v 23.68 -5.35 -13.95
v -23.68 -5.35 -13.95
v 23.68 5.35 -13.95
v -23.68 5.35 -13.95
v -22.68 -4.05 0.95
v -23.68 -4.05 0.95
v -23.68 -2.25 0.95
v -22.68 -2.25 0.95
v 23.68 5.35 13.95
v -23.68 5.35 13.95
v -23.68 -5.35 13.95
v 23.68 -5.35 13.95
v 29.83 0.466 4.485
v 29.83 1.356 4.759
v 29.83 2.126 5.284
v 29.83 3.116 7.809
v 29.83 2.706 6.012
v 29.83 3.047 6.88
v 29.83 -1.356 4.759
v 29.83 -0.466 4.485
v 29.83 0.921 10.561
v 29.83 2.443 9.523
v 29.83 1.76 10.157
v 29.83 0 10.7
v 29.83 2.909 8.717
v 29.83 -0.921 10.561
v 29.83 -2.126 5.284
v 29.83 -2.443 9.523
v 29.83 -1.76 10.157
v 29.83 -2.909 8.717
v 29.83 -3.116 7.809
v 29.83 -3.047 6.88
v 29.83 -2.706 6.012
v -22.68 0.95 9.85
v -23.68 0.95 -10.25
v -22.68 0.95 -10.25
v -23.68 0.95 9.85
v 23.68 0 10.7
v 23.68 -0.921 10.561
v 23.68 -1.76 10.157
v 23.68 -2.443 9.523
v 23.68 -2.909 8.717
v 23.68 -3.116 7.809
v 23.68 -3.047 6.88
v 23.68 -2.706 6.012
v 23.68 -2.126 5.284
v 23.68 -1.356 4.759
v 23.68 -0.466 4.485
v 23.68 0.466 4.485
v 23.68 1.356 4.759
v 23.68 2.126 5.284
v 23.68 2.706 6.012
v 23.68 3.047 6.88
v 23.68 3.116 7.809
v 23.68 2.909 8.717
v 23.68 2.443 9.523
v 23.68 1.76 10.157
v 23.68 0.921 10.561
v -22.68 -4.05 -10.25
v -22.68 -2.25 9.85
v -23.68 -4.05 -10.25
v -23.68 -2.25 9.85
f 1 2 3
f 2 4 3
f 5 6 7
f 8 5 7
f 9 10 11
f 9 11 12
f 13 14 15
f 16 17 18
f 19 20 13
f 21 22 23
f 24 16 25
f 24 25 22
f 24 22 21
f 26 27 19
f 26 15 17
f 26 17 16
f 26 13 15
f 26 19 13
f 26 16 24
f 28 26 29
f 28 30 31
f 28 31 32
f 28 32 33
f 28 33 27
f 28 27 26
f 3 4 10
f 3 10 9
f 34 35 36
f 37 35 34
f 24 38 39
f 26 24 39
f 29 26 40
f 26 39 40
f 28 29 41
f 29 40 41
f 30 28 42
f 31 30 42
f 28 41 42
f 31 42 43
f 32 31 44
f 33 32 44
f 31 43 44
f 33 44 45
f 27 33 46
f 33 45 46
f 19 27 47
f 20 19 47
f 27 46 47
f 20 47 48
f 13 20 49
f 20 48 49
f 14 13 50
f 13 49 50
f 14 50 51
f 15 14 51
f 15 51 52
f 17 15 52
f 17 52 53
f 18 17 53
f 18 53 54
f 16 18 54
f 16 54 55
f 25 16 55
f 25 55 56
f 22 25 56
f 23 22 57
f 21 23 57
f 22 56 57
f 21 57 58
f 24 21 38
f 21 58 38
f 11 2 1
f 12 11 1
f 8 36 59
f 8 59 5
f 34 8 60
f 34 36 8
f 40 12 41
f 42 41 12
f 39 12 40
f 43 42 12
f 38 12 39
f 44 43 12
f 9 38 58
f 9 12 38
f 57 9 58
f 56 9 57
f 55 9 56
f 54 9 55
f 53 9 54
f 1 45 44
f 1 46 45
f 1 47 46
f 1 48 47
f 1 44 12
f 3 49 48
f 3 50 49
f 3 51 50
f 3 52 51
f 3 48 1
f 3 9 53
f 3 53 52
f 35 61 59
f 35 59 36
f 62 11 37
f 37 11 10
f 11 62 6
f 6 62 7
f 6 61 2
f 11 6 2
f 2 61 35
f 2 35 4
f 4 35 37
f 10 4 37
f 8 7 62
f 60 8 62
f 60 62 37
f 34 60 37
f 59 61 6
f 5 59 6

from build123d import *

# Parameters (mm, degrees)
SKETCH1_W           = 47.36
SKETCH1_H           = 27.9
BOSS_EXTRUDE1_DEPTH = 5.35
SKETCH2_R           = 3.125
BOSS_EXTRUDE2_DEPTH = 6.15
SKETCH3_W           = 11.2
SKETCH3_H           = 5
CUT_EXTRUDE1_DEPTH  = 1
SKETCH5_W           = 8.9
SKETCH5_H           = 3.2
CUT_EXTRUDE2_DEPTH  = 1


with BuildPart() as part:
    # Sketch1 → Boss-Extrude1 (new, symmetric)
    with BuildSketch(Plane(origin=(0, 0, 0), x_dir=(1, 0, 0), z_dir=(0, 1, 0))):
        Rectangle(SKETCH1_W, SKETCH1_H)
    extrude(amount=BOSS_EXTRUDE1_DEPTH, both=True)

    # Sketch2 → Boss-Extrude2 (add)
    with BuildSketch(Plane(origin=(23.68, 0, 0), x_dir=(0, 0, -1), z_dir=(1, 0, 0))):
        with Locations(Location((-7.575, 0, 0), (0, 0, 180))):
            Circle(SKETCH2_R)
    extrude(amount=BOSS_EXTRUDE2_DEPTH)

    # Sketch3 → Cut-Extrude1 (cut)
    with BuildSketch(Plane.ZY.offset(23.68)):
        with Locations((-4.65, -1.55)):
            Rectangle(SKETCH3_W, SKETCH3_H)
    extrude(amount=-CUT_EXTRUDE1_DEPTH, mode=Mode.SUBTRACT)

    # Sketch5 → Cut-Extrude2 (cut)
    with BuildSketch(Plane.ZY.offset(23.68)):
        with Locations((5.4, -0.65)):
            Rectangle(SKETCH5_W, SKETCH5_H)
    extrude(amount=-CUT_EXTRUDE2_DEPTH, mode=Mode.SUBTRACT)


solid = part.part
